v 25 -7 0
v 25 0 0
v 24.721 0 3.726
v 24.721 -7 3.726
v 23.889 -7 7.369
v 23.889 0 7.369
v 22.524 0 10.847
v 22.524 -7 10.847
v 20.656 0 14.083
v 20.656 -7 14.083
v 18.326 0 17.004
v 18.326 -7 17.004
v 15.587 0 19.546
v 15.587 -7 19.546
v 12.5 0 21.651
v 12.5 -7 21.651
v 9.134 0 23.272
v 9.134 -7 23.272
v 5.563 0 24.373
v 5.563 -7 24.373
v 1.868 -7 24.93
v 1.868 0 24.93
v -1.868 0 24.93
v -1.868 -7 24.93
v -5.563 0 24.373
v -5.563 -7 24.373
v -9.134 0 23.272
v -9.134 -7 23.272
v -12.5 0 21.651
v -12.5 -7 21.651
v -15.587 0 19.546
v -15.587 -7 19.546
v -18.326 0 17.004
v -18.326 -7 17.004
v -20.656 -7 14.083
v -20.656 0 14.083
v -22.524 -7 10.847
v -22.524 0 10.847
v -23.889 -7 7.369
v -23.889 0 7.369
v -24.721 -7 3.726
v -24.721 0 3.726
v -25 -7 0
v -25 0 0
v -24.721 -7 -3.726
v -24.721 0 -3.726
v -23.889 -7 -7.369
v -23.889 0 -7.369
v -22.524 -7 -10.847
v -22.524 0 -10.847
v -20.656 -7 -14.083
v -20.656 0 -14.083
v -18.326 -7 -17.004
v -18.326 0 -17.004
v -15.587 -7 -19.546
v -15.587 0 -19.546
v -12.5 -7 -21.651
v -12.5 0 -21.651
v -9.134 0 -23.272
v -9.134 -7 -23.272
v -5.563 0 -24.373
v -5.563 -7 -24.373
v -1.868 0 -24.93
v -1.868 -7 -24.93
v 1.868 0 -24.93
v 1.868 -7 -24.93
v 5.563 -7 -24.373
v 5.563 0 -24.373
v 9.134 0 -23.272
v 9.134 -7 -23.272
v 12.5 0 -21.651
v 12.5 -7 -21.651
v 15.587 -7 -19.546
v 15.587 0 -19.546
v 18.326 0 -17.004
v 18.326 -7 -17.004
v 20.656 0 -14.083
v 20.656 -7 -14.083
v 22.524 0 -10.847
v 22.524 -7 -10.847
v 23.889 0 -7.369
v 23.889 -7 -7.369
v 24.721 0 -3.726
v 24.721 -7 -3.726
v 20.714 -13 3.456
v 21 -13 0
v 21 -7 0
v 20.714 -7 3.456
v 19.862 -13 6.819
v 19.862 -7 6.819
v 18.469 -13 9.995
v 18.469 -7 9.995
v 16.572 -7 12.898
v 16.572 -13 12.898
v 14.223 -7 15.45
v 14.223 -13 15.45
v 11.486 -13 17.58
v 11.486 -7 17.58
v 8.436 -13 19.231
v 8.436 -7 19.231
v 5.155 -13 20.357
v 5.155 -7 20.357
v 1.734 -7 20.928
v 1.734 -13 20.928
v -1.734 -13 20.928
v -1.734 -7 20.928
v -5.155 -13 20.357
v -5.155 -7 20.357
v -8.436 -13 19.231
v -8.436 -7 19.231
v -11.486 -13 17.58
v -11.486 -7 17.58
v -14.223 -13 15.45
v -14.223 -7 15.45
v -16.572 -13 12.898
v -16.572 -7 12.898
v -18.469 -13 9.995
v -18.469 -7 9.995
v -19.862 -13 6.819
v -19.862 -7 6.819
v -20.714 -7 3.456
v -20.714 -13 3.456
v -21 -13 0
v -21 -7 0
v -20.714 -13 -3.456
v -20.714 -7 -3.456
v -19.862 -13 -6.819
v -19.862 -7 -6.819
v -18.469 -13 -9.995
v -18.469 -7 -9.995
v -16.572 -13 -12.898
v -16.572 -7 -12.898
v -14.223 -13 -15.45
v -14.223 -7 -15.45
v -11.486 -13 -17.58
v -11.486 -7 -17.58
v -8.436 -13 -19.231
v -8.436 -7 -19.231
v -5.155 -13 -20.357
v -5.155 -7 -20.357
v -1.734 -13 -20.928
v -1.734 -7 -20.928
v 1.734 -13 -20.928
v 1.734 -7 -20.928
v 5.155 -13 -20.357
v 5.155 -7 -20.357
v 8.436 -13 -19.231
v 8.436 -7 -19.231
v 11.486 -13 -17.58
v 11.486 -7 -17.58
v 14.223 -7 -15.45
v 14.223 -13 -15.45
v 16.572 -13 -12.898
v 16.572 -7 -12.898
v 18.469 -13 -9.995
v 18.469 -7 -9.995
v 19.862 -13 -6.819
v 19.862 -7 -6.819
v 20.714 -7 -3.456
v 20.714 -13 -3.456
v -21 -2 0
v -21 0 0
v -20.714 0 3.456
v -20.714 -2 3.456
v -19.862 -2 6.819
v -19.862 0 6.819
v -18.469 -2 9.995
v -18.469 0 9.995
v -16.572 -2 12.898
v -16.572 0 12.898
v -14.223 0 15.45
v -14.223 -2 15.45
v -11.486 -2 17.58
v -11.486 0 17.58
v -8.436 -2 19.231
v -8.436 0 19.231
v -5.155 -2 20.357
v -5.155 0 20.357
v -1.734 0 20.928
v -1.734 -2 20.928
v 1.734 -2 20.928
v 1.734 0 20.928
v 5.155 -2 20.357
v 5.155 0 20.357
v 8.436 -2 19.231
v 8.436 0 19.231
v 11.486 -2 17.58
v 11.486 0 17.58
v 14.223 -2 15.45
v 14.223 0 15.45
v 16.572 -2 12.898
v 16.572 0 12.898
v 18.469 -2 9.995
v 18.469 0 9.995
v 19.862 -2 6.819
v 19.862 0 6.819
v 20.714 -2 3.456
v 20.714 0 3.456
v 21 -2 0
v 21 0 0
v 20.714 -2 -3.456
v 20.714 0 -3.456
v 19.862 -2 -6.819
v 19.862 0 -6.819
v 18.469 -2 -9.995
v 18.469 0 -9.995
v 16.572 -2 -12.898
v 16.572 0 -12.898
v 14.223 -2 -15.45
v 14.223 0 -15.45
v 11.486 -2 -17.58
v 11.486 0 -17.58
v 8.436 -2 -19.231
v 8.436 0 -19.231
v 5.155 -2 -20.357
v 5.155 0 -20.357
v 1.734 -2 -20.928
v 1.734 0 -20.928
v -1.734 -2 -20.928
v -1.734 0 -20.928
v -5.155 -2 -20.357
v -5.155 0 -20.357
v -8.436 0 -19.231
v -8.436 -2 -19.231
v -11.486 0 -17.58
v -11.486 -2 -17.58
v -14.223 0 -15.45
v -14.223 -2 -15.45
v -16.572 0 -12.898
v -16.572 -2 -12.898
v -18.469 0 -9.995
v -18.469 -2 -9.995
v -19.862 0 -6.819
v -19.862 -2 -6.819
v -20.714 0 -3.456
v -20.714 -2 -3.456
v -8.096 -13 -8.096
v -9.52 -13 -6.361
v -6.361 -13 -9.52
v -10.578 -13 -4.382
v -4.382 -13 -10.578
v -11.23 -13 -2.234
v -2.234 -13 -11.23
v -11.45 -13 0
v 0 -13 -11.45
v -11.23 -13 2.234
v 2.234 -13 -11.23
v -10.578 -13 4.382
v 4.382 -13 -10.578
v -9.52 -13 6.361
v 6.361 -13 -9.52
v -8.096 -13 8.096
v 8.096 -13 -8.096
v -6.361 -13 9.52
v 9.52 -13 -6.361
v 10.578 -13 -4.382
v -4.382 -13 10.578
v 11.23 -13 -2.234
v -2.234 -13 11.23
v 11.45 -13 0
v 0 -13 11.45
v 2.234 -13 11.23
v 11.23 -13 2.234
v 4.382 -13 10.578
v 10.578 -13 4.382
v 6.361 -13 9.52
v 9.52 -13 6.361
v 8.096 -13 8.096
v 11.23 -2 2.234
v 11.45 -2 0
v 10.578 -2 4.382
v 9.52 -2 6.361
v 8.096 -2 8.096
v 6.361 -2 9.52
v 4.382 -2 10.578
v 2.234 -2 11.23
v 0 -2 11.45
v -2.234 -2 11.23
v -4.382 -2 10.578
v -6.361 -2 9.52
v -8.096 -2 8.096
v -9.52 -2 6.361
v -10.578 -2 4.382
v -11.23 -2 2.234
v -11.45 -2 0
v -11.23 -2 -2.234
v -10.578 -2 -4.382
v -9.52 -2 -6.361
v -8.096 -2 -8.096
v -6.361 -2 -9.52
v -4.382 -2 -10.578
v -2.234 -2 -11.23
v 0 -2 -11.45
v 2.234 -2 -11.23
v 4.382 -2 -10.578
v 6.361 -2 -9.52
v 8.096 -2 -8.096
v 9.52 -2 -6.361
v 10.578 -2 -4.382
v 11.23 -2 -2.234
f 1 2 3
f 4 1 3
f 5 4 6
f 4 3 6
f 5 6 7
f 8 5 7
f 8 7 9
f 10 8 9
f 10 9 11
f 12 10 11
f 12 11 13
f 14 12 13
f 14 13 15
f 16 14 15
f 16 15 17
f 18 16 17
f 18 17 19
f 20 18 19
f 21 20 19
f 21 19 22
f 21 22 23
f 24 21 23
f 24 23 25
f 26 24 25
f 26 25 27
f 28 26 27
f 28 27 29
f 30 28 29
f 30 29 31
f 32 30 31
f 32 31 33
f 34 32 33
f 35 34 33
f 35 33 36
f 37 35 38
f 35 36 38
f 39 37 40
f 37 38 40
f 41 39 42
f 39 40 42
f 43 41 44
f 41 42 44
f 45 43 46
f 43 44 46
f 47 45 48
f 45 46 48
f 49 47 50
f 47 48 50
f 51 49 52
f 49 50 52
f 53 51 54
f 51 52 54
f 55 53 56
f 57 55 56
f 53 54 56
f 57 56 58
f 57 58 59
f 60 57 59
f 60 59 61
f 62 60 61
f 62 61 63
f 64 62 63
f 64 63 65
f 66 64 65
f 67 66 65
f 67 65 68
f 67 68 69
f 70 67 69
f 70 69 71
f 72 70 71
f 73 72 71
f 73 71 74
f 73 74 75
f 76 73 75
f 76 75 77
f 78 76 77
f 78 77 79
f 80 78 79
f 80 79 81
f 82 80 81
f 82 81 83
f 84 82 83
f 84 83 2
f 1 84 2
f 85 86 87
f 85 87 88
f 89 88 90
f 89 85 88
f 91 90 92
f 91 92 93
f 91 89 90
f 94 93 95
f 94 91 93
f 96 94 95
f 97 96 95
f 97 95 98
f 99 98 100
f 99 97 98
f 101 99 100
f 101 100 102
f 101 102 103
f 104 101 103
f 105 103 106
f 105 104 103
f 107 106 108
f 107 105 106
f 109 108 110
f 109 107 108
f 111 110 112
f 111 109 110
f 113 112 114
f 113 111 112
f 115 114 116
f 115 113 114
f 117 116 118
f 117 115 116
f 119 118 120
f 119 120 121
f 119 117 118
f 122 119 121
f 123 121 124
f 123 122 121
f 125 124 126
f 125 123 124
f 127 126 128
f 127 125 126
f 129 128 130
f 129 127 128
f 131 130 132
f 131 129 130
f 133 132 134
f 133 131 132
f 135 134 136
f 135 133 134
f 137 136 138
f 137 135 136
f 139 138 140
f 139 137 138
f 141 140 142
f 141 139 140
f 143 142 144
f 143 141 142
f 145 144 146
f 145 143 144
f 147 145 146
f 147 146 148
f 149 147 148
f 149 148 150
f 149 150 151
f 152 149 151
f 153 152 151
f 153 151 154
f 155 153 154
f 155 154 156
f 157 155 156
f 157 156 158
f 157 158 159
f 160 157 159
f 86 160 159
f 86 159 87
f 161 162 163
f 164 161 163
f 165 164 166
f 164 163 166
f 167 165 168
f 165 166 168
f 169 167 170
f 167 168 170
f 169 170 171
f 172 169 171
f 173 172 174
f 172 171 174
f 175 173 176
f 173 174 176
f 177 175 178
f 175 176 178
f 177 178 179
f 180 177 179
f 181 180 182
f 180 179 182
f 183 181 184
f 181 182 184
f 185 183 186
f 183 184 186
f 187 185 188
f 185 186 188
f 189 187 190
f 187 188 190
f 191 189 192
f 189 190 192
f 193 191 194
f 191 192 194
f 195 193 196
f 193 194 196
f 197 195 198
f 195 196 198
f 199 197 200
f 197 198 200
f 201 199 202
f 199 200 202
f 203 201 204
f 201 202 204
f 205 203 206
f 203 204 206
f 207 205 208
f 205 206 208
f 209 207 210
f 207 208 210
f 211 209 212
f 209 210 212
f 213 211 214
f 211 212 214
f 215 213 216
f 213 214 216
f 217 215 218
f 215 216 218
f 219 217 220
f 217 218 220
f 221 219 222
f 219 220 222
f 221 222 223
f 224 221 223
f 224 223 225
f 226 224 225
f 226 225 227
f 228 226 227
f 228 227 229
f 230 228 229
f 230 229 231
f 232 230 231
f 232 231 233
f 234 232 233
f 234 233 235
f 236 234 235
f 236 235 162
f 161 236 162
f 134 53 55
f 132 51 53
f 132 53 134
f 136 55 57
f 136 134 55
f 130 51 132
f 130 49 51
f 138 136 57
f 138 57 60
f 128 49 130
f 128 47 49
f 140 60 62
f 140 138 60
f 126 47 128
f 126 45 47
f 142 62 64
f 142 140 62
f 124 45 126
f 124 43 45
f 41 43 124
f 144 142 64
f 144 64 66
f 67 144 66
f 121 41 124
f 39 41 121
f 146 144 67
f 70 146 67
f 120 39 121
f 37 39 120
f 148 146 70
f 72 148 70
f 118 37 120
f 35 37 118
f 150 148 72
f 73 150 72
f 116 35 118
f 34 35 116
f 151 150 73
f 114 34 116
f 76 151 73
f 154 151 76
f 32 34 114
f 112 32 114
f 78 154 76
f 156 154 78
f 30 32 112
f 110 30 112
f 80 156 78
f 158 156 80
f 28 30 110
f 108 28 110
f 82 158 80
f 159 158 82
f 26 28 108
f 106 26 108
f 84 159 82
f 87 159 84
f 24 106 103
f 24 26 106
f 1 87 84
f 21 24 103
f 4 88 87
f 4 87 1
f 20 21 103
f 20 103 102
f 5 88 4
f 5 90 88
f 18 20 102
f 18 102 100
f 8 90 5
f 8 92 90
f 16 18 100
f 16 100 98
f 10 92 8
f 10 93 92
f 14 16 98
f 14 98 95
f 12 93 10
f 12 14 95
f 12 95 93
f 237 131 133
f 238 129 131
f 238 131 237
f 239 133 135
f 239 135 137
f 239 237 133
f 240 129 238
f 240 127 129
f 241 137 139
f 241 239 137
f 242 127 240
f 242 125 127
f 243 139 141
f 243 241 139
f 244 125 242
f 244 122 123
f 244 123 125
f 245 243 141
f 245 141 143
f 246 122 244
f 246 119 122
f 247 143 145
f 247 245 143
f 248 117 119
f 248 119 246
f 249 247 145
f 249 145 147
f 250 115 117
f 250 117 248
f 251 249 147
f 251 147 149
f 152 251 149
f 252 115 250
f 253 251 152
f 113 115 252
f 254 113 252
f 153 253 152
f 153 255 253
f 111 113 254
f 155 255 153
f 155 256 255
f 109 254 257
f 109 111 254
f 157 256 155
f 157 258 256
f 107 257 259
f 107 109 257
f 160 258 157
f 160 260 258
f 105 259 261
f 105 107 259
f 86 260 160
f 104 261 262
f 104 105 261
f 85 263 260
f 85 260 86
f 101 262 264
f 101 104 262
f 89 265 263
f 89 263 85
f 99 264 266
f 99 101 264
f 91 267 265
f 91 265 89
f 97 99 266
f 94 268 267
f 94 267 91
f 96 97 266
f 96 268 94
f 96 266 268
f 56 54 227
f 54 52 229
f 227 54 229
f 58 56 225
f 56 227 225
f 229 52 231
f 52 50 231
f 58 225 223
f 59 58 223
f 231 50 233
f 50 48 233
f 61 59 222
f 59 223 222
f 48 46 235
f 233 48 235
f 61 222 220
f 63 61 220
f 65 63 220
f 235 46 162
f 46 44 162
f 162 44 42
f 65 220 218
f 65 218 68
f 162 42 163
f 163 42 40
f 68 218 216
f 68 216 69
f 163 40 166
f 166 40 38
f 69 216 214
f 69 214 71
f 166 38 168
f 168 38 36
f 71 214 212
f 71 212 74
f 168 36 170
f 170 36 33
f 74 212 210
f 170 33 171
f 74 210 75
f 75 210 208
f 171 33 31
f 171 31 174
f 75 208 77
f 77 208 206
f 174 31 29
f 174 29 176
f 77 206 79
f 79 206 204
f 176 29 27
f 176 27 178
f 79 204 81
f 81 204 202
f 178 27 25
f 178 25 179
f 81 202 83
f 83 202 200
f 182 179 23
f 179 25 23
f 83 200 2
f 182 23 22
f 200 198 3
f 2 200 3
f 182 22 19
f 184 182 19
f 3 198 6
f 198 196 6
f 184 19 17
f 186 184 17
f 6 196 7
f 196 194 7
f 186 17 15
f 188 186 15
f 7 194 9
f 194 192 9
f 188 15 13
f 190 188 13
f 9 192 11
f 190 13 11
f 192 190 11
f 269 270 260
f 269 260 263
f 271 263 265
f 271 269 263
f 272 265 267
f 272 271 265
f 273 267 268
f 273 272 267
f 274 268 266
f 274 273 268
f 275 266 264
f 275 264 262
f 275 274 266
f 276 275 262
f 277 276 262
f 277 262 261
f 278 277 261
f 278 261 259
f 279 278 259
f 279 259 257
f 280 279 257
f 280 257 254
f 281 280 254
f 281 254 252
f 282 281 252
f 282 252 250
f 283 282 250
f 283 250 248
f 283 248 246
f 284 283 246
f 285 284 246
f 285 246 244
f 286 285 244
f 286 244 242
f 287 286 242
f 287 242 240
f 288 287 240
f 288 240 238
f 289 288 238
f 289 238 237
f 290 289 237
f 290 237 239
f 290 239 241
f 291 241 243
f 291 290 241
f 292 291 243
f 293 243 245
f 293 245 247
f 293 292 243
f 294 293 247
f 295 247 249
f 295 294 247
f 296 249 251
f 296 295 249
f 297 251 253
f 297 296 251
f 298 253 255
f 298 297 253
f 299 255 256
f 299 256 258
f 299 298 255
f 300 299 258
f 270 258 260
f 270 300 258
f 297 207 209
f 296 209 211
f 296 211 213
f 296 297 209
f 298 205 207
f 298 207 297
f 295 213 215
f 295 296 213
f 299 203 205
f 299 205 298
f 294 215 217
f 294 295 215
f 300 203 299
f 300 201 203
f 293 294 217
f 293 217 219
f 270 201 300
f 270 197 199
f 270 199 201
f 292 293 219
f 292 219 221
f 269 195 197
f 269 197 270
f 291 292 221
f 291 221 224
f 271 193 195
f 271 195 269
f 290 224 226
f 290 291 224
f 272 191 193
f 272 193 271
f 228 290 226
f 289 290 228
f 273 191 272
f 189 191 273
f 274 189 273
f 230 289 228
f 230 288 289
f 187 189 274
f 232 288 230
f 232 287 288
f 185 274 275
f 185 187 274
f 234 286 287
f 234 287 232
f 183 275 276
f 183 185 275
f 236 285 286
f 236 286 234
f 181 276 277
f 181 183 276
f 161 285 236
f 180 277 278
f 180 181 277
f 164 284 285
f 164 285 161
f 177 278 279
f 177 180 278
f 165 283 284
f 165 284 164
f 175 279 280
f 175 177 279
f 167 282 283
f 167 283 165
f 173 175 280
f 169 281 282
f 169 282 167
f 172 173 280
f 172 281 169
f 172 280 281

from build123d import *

# Parameters (mm, degrees)
F0_R     = 25
F0_R_2   = 11.45
F1_DEPTH = 13
F2_R     = 25
F2_R_2   = 21
F2_R_3   = 11.45
F3_DEPTH = 6
F4_R     = 21
F4_R_2   = 11.45
F5_DEPTH = 2


with BuildPart() as f1:
    # F0 (on Front) → F1 (new body)
    with BuildSketch(Plane.XZ):
        Circle(F0_R)
        Circle(F0_R_2, mode=Mode.SUBTRACT)
    extrude(amount=F1_DEPTH)

    # F2 (on face) → F3 (cut)
    with BuildSketch(Plane.XZ.offset(13)):
        Circle(F2_R)
        Circle(F2_R_2, mode=Mode.SUBTRACT)
        Circle(F2_R_3)
    extrude(amount=-F3_DEPTH, mode=Mode.SUBTRACT)

    # F4 (on face) → F5 (cut)
    with BuildSketch(Plane(origin=(0, 0, 0), x_dir=(-1, 0, 0), z_dir=(0, 1, 0))):
        Circle(F4_R)
        Circle(F4_R_2, mode=Mode.SUBTRACT)
    extrude(amount=-F5_DEPTH, mode=Mode.SUBTRACT)


solid = f1.part
